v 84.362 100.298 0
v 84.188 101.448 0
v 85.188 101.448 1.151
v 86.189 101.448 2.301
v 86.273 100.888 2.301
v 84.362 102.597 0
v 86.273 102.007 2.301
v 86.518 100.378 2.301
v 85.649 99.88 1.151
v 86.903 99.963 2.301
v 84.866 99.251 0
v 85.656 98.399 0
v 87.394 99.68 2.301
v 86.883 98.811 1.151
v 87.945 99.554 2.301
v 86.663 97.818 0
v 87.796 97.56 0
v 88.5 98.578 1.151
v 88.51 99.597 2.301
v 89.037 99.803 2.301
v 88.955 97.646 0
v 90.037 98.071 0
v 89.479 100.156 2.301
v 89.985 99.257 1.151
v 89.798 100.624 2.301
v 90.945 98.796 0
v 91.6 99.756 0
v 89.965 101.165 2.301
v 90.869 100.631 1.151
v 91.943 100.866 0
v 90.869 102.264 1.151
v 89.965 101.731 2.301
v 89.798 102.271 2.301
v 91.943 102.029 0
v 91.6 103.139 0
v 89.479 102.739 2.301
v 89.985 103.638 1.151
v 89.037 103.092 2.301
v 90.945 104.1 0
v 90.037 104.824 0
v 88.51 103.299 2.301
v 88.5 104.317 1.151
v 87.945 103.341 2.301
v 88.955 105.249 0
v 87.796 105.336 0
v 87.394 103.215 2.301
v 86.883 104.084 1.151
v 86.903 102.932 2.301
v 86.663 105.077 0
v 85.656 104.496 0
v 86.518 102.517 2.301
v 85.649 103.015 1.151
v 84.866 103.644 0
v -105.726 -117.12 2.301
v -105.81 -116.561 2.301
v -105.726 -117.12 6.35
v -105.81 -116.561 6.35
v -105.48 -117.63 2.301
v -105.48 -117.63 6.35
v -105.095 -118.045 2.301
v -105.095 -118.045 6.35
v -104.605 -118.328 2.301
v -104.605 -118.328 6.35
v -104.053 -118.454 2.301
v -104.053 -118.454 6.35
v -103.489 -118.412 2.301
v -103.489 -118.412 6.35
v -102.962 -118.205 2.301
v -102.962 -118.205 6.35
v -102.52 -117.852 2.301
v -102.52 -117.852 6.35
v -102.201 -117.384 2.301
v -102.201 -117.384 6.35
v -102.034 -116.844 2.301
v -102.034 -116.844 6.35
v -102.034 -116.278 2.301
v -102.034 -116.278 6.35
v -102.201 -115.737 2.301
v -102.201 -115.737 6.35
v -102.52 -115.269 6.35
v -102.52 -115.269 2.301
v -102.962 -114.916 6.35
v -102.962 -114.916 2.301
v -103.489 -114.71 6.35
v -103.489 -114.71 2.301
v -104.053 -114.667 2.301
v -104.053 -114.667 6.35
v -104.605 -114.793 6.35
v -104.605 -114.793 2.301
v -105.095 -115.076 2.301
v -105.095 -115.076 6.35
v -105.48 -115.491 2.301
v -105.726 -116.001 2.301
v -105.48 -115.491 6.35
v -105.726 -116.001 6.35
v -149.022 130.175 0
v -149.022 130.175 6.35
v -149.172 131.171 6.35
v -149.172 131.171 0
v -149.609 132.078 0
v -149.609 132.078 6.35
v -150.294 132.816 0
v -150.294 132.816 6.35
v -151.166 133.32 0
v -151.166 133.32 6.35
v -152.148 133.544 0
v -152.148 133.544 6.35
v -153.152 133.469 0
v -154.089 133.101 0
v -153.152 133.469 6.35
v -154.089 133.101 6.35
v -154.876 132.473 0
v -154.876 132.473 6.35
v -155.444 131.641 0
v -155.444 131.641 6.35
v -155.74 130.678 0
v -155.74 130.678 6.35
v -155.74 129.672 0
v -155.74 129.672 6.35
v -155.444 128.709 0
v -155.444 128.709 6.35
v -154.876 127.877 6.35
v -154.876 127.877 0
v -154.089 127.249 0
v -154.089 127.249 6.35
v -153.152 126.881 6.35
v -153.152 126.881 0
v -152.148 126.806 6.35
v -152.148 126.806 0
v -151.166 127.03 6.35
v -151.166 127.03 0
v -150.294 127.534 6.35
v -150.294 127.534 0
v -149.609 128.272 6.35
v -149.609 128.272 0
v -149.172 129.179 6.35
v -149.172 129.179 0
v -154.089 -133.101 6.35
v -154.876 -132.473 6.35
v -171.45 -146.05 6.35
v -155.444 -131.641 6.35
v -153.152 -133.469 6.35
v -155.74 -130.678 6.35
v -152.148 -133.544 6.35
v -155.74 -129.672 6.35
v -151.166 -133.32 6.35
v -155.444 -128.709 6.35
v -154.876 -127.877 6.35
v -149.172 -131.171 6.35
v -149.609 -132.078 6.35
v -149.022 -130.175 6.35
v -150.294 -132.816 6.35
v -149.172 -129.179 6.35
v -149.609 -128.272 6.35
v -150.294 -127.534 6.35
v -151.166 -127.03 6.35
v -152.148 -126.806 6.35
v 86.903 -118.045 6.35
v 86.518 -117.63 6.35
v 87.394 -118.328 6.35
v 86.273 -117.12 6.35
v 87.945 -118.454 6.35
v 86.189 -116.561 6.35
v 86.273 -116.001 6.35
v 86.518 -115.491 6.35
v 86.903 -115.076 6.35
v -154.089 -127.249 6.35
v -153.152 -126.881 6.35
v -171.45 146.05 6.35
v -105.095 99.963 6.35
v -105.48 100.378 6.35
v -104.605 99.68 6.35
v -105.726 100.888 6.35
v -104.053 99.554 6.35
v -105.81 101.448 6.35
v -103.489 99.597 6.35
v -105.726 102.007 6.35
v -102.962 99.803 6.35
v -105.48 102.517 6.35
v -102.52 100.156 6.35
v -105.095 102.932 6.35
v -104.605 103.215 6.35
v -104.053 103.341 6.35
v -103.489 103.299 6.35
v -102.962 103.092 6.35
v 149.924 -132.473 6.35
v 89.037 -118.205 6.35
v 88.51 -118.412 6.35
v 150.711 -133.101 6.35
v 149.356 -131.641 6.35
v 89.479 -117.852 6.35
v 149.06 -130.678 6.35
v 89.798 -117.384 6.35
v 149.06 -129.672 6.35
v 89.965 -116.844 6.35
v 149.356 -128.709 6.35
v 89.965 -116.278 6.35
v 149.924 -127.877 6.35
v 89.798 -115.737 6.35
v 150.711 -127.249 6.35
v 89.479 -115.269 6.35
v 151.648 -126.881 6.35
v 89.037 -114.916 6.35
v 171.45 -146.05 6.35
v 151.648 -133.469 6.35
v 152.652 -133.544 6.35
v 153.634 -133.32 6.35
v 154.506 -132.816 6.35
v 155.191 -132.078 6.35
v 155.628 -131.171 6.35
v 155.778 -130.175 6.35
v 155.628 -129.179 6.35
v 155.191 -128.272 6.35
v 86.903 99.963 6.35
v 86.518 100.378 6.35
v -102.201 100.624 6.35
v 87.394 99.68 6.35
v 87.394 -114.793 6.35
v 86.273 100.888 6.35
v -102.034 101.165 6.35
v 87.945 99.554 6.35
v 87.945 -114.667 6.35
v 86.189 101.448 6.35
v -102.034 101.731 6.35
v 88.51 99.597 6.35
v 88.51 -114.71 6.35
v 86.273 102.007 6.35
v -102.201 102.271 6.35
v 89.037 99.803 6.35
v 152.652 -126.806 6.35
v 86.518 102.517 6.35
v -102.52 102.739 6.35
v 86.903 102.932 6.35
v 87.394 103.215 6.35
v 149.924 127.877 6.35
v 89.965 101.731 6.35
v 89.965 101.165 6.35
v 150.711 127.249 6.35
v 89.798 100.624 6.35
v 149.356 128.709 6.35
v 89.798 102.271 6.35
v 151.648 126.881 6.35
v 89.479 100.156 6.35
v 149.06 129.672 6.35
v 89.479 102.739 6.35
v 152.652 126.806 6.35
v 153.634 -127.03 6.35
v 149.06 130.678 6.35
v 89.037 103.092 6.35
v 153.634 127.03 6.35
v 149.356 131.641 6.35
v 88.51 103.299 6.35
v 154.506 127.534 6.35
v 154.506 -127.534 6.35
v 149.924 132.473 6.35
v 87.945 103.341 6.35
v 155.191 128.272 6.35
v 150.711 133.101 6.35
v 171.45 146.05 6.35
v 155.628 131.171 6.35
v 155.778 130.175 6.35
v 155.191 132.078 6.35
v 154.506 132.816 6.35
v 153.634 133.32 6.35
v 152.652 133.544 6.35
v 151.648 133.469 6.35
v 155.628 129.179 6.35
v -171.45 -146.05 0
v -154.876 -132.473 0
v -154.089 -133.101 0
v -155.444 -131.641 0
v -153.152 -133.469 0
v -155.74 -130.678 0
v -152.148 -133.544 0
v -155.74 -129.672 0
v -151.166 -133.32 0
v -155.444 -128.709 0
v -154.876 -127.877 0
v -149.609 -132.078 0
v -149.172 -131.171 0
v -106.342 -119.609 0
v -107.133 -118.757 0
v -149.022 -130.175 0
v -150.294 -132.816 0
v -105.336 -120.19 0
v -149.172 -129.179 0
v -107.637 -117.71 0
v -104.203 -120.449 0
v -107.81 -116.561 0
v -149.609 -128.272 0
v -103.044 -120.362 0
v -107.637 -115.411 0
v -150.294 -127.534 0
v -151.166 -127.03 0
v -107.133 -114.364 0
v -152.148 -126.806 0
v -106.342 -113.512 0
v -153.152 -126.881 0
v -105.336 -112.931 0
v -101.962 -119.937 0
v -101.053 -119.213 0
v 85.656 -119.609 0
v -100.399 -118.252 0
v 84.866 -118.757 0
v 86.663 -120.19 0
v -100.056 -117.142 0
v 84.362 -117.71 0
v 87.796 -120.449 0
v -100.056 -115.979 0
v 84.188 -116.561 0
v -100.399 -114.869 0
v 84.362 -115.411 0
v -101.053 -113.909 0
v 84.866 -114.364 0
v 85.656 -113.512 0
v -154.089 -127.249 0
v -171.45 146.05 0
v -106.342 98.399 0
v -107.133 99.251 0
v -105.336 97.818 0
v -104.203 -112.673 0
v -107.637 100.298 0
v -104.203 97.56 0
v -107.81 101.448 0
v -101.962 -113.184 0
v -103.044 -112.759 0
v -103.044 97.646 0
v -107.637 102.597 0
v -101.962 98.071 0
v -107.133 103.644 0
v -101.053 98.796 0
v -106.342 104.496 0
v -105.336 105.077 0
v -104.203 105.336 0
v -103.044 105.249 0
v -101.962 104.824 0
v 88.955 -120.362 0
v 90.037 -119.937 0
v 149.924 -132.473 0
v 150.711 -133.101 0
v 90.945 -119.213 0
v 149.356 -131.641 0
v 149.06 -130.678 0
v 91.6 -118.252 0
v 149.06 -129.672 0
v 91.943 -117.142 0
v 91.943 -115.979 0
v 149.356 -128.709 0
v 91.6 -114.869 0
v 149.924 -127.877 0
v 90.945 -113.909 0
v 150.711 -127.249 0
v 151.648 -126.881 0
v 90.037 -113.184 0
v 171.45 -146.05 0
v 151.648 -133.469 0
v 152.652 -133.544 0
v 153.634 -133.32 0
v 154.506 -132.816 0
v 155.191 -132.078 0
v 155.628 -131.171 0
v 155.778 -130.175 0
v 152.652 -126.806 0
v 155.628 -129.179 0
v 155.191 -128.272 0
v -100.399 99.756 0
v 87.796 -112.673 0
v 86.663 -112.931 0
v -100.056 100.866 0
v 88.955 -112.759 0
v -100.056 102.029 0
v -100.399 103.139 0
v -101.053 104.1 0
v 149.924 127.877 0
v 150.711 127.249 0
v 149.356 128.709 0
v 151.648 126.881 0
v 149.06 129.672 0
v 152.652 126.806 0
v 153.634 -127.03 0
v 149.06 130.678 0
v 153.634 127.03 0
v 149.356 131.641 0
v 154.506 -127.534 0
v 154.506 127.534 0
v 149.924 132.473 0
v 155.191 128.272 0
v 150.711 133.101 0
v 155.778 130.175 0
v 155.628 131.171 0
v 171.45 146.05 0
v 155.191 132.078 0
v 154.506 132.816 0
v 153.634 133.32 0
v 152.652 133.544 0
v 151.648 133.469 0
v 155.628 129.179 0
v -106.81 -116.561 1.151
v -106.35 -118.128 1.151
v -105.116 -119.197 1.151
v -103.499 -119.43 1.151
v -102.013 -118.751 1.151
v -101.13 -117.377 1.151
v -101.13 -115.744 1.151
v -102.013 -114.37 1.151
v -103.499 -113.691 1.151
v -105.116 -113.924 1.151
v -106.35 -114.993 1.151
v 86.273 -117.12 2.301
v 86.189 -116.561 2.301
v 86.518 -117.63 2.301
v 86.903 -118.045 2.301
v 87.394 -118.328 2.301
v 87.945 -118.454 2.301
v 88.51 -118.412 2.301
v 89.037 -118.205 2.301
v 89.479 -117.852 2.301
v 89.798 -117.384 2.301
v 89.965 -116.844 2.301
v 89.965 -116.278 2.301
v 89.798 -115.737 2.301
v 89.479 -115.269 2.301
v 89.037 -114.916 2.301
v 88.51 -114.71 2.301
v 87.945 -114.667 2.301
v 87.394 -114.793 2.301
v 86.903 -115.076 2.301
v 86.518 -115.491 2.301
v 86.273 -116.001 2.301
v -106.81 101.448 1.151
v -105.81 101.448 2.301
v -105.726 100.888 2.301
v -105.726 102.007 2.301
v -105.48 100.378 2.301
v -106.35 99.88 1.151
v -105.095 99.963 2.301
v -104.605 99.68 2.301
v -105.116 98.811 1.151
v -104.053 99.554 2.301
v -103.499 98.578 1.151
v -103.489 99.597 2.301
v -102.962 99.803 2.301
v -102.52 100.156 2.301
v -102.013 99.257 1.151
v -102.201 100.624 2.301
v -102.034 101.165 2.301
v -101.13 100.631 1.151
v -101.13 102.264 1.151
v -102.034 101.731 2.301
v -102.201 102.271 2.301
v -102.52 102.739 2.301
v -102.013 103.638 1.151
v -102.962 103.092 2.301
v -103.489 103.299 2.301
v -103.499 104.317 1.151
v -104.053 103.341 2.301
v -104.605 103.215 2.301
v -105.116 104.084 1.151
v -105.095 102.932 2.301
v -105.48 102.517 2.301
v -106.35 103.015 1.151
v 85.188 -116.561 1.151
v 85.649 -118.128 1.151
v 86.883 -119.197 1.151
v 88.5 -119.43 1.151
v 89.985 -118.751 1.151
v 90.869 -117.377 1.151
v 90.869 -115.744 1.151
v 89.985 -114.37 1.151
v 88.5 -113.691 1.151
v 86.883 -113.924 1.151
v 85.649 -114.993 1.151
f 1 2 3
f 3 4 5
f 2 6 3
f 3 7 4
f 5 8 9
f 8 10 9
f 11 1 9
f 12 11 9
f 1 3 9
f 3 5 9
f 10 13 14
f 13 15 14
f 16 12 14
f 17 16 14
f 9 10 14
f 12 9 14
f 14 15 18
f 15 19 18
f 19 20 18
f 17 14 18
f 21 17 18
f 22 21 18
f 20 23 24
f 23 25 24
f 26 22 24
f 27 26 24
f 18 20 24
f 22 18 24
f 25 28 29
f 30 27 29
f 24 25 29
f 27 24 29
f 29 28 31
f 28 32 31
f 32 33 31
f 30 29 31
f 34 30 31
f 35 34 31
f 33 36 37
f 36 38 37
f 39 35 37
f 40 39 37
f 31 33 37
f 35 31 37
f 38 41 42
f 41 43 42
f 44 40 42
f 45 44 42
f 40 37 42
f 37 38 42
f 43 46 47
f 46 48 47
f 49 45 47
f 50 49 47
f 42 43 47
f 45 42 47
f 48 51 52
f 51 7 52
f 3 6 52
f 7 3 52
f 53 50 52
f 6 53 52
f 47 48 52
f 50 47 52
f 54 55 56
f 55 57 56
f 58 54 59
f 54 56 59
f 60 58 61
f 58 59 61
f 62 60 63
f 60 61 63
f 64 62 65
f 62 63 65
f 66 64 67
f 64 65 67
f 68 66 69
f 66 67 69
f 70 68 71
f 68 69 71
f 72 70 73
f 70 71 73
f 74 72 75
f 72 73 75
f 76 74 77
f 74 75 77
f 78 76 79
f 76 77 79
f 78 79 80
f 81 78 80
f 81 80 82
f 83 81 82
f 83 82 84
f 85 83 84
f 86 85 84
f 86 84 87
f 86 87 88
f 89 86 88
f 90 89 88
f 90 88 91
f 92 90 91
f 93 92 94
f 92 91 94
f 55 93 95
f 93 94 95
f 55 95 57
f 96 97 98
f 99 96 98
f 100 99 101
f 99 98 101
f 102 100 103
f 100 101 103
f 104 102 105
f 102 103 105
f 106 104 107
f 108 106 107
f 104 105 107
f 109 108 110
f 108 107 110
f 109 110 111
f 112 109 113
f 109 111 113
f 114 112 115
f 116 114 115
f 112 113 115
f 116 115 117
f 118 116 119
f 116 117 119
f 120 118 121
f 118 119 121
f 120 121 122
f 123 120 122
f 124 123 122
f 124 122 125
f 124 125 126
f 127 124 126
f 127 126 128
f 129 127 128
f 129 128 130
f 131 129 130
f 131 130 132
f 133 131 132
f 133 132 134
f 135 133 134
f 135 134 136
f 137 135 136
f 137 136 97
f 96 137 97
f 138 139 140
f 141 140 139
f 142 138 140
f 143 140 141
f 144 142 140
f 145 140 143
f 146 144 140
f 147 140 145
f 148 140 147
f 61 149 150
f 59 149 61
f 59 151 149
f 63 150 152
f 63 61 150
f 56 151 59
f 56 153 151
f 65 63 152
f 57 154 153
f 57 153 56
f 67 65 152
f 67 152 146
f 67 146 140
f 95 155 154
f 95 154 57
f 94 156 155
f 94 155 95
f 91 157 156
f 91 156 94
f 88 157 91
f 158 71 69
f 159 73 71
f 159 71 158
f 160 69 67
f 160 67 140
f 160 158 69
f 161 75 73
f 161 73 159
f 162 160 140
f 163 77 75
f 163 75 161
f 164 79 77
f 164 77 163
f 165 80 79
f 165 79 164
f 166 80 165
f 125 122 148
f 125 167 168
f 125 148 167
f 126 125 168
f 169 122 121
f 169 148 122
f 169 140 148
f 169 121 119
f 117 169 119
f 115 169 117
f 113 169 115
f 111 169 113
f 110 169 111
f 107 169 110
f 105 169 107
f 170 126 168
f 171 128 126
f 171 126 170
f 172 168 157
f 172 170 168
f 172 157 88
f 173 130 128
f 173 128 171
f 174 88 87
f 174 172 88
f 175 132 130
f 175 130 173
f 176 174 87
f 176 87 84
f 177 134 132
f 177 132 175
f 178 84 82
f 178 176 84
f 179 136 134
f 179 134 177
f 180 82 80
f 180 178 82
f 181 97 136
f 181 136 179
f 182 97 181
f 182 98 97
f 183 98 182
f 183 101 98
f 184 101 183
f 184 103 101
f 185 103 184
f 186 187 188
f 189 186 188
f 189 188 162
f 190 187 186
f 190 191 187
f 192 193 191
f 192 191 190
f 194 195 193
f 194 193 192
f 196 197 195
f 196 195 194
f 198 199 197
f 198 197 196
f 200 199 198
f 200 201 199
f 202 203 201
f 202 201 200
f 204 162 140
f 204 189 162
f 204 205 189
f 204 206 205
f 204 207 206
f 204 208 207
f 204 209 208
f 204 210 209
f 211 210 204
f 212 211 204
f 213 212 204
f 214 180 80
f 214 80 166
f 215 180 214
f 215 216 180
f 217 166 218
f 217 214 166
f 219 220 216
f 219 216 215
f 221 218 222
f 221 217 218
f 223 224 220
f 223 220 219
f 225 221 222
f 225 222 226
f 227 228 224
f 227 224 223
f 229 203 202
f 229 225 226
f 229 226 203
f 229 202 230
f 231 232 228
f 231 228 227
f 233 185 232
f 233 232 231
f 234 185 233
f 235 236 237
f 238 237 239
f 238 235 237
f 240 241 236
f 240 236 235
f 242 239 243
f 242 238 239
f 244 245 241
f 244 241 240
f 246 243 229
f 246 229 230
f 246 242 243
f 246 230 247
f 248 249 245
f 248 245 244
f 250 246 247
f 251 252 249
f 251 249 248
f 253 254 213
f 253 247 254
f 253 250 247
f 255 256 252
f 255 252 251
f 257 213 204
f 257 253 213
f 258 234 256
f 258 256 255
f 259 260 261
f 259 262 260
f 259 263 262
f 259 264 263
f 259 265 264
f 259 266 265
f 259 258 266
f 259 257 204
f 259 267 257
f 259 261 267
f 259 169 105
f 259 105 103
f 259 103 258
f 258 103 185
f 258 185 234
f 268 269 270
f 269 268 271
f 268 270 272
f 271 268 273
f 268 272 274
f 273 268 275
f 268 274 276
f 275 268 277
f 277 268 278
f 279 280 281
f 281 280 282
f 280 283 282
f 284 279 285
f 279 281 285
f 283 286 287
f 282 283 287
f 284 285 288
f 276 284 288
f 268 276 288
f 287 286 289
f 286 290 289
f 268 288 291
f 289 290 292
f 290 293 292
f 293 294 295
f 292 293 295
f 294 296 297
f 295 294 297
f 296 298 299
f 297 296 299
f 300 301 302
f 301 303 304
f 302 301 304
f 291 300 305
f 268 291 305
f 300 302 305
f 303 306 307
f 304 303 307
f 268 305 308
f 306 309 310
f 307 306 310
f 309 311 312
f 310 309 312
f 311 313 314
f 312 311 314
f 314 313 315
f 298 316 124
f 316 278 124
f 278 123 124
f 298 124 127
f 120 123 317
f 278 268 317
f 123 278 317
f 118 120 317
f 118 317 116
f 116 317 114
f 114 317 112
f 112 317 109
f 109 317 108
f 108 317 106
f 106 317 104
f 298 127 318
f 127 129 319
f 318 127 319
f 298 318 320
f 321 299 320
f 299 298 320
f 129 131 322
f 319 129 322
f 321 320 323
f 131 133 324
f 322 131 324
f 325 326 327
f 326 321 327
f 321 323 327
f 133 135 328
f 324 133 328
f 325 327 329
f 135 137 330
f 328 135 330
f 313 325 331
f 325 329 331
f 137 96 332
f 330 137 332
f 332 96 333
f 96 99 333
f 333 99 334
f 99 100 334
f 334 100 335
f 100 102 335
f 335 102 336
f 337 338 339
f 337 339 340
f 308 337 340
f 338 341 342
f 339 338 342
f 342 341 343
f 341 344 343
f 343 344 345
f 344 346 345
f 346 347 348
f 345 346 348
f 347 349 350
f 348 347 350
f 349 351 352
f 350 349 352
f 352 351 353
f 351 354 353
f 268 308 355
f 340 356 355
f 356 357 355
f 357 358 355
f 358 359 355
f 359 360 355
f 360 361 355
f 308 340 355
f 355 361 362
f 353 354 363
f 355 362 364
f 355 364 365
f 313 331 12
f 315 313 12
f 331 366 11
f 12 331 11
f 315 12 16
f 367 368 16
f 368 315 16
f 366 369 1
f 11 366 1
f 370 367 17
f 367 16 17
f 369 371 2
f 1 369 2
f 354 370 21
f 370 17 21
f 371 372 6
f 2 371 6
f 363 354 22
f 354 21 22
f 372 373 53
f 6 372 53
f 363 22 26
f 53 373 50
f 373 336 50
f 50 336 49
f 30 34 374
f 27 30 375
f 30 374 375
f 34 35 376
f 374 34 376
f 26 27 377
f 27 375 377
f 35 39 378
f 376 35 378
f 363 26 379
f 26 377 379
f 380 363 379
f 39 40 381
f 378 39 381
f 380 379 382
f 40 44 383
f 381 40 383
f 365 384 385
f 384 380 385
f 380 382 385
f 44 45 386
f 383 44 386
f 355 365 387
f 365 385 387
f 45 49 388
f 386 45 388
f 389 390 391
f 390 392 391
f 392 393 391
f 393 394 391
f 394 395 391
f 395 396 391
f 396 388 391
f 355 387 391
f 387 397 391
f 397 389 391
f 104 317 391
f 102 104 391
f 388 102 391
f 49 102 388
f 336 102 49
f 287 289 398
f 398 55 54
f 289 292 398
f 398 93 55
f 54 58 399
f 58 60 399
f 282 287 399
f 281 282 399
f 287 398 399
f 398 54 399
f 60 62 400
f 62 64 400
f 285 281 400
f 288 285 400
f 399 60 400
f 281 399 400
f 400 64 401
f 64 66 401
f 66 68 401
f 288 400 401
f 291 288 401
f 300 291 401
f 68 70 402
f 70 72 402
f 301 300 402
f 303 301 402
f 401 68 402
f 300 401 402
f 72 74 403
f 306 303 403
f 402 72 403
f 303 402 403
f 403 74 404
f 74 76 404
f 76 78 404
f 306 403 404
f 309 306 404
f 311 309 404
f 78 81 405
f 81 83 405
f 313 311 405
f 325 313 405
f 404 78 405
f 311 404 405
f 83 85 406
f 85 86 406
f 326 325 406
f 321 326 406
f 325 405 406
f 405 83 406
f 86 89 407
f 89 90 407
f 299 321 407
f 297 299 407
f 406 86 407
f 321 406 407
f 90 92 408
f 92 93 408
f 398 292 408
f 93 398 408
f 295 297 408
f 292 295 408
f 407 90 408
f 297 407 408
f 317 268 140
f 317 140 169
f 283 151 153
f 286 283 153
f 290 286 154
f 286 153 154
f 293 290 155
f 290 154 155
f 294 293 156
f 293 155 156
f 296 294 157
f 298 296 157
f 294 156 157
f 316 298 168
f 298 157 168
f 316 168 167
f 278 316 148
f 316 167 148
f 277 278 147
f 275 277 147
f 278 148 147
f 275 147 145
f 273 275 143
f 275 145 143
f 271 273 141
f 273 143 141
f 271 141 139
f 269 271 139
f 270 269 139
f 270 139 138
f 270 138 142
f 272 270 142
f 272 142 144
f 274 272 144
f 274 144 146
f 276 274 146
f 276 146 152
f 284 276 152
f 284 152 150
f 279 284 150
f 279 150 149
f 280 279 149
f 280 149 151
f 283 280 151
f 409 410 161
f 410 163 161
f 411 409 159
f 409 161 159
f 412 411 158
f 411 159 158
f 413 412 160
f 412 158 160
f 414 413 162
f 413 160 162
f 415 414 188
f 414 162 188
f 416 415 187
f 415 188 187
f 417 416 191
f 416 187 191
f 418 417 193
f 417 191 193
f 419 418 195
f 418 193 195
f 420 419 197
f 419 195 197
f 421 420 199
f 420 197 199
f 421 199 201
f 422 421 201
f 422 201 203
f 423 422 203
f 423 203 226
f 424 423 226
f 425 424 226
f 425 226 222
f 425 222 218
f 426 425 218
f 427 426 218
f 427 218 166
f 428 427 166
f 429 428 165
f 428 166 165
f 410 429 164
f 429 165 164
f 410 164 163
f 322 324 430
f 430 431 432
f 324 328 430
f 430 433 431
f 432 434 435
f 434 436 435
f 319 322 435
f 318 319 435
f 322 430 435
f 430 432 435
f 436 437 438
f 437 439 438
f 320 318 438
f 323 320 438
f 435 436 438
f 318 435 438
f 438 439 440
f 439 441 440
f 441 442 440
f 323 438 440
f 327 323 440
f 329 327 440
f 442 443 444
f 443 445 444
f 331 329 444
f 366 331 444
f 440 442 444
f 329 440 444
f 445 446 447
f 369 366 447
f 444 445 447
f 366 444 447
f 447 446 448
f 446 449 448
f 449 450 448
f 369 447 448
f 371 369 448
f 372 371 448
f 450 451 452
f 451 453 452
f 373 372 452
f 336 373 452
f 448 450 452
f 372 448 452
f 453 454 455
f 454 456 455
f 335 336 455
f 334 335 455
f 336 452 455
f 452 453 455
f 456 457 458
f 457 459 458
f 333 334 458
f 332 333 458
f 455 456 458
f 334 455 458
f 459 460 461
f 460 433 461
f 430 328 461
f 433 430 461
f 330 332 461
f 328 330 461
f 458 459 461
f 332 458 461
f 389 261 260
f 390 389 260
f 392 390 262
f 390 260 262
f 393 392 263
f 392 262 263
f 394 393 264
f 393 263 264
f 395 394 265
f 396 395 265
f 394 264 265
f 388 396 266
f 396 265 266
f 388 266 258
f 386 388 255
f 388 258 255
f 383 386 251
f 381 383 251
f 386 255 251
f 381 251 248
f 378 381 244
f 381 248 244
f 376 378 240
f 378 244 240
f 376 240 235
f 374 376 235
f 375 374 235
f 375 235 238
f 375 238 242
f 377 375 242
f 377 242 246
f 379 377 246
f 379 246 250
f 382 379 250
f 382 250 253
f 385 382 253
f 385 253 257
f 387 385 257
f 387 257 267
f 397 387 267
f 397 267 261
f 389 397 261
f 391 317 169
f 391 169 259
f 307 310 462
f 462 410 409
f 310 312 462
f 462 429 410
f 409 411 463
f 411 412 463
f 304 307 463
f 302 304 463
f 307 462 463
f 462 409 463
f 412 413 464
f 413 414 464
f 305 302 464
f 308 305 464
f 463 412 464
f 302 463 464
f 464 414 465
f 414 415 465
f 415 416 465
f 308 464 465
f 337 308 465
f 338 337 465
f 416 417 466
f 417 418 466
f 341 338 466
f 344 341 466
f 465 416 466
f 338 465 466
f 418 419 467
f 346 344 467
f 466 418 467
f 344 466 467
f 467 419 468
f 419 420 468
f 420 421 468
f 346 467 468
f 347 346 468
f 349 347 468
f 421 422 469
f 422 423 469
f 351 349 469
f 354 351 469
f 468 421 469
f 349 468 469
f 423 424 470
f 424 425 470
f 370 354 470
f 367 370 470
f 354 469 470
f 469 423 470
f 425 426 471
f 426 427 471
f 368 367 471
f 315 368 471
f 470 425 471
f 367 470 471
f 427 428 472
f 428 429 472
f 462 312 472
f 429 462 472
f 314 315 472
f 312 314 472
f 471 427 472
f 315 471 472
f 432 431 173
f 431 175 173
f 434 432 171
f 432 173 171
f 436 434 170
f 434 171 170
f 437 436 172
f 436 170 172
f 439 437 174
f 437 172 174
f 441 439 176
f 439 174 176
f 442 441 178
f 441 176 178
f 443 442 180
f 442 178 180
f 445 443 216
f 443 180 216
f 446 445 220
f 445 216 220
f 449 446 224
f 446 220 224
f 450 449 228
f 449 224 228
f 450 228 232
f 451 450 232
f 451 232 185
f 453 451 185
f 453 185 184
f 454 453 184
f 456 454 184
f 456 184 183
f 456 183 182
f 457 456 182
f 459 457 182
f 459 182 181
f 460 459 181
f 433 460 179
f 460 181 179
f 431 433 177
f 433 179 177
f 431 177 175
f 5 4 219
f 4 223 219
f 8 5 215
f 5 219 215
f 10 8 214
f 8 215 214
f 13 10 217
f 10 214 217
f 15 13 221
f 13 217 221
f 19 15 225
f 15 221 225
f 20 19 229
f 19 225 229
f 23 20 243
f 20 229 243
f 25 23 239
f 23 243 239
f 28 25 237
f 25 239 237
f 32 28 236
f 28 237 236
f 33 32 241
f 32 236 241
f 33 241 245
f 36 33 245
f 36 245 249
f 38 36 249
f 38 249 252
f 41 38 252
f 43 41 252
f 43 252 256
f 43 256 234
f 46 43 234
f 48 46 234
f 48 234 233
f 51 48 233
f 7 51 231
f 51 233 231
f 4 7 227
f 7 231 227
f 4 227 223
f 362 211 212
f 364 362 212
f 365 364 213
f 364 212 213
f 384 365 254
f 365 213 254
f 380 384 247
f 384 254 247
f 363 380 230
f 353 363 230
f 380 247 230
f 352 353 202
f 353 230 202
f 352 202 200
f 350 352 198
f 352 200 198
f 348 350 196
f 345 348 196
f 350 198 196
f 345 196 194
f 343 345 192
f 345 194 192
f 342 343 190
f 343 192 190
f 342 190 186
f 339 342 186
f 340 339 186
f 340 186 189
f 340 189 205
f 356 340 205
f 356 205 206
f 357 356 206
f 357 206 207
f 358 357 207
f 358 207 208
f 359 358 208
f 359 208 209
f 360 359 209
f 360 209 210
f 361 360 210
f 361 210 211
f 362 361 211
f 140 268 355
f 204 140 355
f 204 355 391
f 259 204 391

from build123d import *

# Parameters (mm, degrees)
F0_W           = 342.9
F0_H           = 292.1
F1_DEPTH       = 6.35
F2_R           = 3.3782
F3_DEPTH       = 6.351
F5_D           = 3.7973
F5_CSINK_D     = 7.7978
F5_CSINK_ANGLE = 82


with BuildPart() as f1:
    # F0 (on Top) → F1 (new body)
    with BuildSketch(Plane.XY):
        Rectangle(F0_W, F0_H)
    extrude(amount=F1_DEPTH)

    # F2 (on face) → F3 (cut, through all)
    with BuildSketch(Plane.XY.offset(6.35)):
        with Locations((-152.4, 130.175)):
            Circle(F2_R)
        with Locations((152.4, 130.175)):
            Circle(F2_R)
        with Locations((152.4, -130.175)):
            Circle(F2_R)
        with Locations((-152.4, -130.175)):
            Circle(F2_R)
    extrude(amount=-F3_DEPTH, mode=Mode.SUBTRACT)

    # F5 (through all)
    with Locations(Plane(origin=(0, 0, 0), x_dir=(1, 0, 0), z_dir=(0, 0, -1))):
        with Locations((-103.9114, 116.5606), (88.0872, 116.5606), (88.0872, -101.4476), (-103.9114, -101.4476)):
            CounterSinkHole(F5_D / 2, F5_CSINK_D / 2, counter_sink_angle=F5_CSINK_ANGLE)


solid = f1.part
